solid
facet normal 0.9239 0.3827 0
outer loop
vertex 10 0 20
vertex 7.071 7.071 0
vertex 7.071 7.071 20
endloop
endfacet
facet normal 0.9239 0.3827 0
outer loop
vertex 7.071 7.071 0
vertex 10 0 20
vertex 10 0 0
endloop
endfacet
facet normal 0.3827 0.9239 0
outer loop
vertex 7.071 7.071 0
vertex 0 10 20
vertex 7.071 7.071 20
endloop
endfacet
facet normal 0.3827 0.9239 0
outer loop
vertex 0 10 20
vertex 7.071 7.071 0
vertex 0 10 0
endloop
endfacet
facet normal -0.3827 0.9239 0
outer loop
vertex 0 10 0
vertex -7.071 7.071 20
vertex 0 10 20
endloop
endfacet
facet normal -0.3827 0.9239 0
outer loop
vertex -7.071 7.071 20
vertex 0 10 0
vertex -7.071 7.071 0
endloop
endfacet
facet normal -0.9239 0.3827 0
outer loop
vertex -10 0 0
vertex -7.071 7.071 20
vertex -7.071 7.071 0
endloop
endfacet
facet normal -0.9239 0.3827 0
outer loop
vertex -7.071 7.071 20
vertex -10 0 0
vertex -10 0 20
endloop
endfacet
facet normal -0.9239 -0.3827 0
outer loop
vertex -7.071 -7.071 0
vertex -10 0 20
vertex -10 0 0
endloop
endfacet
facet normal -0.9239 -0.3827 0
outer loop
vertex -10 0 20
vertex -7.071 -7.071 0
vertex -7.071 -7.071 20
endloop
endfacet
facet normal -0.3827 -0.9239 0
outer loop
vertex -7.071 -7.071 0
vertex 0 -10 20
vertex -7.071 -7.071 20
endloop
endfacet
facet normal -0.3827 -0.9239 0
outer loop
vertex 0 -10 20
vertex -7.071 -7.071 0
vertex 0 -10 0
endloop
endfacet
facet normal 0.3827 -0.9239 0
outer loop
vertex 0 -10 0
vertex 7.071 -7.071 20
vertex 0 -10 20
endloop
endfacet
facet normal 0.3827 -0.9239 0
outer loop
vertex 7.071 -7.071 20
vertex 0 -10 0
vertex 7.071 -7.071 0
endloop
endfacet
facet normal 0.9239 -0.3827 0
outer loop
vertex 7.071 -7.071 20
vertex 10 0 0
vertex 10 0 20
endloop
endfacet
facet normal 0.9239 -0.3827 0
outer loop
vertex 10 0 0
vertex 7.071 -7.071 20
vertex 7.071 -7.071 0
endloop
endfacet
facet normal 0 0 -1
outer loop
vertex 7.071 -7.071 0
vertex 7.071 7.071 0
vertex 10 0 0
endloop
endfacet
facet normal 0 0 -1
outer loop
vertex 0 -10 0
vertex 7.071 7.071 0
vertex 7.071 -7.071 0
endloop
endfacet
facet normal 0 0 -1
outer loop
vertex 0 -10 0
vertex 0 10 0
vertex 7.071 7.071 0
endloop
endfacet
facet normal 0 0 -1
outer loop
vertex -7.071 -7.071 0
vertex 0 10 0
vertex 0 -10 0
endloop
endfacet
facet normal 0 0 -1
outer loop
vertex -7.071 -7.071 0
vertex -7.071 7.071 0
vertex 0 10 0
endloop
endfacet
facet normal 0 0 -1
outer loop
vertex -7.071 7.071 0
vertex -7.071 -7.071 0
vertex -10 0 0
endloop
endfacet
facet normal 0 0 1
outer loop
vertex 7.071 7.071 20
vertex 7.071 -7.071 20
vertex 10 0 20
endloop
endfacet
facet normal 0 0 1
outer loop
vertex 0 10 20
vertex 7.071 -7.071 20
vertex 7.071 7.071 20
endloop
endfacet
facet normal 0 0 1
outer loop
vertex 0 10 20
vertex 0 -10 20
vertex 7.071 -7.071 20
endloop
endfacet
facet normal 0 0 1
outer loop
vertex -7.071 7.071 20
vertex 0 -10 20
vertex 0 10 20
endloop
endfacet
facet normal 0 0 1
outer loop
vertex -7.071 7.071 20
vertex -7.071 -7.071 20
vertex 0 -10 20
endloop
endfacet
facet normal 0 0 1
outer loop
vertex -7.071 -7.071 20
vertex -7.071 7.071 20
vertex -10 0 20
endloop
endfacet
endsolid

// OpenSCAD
// Auto-generated from tests/data/feature_fixtures_manifest.json
// fixture: prism_octagon
// fixture_type: prism
// description: Octagonal prism (8 sides); near-cylinder negative guard for cylinder over-detection.
$fn = 96;

radius = 10.000000;
height = 20.000000;
sides = 8;

cylinder(r=radius, h=height, $fn=sides);
